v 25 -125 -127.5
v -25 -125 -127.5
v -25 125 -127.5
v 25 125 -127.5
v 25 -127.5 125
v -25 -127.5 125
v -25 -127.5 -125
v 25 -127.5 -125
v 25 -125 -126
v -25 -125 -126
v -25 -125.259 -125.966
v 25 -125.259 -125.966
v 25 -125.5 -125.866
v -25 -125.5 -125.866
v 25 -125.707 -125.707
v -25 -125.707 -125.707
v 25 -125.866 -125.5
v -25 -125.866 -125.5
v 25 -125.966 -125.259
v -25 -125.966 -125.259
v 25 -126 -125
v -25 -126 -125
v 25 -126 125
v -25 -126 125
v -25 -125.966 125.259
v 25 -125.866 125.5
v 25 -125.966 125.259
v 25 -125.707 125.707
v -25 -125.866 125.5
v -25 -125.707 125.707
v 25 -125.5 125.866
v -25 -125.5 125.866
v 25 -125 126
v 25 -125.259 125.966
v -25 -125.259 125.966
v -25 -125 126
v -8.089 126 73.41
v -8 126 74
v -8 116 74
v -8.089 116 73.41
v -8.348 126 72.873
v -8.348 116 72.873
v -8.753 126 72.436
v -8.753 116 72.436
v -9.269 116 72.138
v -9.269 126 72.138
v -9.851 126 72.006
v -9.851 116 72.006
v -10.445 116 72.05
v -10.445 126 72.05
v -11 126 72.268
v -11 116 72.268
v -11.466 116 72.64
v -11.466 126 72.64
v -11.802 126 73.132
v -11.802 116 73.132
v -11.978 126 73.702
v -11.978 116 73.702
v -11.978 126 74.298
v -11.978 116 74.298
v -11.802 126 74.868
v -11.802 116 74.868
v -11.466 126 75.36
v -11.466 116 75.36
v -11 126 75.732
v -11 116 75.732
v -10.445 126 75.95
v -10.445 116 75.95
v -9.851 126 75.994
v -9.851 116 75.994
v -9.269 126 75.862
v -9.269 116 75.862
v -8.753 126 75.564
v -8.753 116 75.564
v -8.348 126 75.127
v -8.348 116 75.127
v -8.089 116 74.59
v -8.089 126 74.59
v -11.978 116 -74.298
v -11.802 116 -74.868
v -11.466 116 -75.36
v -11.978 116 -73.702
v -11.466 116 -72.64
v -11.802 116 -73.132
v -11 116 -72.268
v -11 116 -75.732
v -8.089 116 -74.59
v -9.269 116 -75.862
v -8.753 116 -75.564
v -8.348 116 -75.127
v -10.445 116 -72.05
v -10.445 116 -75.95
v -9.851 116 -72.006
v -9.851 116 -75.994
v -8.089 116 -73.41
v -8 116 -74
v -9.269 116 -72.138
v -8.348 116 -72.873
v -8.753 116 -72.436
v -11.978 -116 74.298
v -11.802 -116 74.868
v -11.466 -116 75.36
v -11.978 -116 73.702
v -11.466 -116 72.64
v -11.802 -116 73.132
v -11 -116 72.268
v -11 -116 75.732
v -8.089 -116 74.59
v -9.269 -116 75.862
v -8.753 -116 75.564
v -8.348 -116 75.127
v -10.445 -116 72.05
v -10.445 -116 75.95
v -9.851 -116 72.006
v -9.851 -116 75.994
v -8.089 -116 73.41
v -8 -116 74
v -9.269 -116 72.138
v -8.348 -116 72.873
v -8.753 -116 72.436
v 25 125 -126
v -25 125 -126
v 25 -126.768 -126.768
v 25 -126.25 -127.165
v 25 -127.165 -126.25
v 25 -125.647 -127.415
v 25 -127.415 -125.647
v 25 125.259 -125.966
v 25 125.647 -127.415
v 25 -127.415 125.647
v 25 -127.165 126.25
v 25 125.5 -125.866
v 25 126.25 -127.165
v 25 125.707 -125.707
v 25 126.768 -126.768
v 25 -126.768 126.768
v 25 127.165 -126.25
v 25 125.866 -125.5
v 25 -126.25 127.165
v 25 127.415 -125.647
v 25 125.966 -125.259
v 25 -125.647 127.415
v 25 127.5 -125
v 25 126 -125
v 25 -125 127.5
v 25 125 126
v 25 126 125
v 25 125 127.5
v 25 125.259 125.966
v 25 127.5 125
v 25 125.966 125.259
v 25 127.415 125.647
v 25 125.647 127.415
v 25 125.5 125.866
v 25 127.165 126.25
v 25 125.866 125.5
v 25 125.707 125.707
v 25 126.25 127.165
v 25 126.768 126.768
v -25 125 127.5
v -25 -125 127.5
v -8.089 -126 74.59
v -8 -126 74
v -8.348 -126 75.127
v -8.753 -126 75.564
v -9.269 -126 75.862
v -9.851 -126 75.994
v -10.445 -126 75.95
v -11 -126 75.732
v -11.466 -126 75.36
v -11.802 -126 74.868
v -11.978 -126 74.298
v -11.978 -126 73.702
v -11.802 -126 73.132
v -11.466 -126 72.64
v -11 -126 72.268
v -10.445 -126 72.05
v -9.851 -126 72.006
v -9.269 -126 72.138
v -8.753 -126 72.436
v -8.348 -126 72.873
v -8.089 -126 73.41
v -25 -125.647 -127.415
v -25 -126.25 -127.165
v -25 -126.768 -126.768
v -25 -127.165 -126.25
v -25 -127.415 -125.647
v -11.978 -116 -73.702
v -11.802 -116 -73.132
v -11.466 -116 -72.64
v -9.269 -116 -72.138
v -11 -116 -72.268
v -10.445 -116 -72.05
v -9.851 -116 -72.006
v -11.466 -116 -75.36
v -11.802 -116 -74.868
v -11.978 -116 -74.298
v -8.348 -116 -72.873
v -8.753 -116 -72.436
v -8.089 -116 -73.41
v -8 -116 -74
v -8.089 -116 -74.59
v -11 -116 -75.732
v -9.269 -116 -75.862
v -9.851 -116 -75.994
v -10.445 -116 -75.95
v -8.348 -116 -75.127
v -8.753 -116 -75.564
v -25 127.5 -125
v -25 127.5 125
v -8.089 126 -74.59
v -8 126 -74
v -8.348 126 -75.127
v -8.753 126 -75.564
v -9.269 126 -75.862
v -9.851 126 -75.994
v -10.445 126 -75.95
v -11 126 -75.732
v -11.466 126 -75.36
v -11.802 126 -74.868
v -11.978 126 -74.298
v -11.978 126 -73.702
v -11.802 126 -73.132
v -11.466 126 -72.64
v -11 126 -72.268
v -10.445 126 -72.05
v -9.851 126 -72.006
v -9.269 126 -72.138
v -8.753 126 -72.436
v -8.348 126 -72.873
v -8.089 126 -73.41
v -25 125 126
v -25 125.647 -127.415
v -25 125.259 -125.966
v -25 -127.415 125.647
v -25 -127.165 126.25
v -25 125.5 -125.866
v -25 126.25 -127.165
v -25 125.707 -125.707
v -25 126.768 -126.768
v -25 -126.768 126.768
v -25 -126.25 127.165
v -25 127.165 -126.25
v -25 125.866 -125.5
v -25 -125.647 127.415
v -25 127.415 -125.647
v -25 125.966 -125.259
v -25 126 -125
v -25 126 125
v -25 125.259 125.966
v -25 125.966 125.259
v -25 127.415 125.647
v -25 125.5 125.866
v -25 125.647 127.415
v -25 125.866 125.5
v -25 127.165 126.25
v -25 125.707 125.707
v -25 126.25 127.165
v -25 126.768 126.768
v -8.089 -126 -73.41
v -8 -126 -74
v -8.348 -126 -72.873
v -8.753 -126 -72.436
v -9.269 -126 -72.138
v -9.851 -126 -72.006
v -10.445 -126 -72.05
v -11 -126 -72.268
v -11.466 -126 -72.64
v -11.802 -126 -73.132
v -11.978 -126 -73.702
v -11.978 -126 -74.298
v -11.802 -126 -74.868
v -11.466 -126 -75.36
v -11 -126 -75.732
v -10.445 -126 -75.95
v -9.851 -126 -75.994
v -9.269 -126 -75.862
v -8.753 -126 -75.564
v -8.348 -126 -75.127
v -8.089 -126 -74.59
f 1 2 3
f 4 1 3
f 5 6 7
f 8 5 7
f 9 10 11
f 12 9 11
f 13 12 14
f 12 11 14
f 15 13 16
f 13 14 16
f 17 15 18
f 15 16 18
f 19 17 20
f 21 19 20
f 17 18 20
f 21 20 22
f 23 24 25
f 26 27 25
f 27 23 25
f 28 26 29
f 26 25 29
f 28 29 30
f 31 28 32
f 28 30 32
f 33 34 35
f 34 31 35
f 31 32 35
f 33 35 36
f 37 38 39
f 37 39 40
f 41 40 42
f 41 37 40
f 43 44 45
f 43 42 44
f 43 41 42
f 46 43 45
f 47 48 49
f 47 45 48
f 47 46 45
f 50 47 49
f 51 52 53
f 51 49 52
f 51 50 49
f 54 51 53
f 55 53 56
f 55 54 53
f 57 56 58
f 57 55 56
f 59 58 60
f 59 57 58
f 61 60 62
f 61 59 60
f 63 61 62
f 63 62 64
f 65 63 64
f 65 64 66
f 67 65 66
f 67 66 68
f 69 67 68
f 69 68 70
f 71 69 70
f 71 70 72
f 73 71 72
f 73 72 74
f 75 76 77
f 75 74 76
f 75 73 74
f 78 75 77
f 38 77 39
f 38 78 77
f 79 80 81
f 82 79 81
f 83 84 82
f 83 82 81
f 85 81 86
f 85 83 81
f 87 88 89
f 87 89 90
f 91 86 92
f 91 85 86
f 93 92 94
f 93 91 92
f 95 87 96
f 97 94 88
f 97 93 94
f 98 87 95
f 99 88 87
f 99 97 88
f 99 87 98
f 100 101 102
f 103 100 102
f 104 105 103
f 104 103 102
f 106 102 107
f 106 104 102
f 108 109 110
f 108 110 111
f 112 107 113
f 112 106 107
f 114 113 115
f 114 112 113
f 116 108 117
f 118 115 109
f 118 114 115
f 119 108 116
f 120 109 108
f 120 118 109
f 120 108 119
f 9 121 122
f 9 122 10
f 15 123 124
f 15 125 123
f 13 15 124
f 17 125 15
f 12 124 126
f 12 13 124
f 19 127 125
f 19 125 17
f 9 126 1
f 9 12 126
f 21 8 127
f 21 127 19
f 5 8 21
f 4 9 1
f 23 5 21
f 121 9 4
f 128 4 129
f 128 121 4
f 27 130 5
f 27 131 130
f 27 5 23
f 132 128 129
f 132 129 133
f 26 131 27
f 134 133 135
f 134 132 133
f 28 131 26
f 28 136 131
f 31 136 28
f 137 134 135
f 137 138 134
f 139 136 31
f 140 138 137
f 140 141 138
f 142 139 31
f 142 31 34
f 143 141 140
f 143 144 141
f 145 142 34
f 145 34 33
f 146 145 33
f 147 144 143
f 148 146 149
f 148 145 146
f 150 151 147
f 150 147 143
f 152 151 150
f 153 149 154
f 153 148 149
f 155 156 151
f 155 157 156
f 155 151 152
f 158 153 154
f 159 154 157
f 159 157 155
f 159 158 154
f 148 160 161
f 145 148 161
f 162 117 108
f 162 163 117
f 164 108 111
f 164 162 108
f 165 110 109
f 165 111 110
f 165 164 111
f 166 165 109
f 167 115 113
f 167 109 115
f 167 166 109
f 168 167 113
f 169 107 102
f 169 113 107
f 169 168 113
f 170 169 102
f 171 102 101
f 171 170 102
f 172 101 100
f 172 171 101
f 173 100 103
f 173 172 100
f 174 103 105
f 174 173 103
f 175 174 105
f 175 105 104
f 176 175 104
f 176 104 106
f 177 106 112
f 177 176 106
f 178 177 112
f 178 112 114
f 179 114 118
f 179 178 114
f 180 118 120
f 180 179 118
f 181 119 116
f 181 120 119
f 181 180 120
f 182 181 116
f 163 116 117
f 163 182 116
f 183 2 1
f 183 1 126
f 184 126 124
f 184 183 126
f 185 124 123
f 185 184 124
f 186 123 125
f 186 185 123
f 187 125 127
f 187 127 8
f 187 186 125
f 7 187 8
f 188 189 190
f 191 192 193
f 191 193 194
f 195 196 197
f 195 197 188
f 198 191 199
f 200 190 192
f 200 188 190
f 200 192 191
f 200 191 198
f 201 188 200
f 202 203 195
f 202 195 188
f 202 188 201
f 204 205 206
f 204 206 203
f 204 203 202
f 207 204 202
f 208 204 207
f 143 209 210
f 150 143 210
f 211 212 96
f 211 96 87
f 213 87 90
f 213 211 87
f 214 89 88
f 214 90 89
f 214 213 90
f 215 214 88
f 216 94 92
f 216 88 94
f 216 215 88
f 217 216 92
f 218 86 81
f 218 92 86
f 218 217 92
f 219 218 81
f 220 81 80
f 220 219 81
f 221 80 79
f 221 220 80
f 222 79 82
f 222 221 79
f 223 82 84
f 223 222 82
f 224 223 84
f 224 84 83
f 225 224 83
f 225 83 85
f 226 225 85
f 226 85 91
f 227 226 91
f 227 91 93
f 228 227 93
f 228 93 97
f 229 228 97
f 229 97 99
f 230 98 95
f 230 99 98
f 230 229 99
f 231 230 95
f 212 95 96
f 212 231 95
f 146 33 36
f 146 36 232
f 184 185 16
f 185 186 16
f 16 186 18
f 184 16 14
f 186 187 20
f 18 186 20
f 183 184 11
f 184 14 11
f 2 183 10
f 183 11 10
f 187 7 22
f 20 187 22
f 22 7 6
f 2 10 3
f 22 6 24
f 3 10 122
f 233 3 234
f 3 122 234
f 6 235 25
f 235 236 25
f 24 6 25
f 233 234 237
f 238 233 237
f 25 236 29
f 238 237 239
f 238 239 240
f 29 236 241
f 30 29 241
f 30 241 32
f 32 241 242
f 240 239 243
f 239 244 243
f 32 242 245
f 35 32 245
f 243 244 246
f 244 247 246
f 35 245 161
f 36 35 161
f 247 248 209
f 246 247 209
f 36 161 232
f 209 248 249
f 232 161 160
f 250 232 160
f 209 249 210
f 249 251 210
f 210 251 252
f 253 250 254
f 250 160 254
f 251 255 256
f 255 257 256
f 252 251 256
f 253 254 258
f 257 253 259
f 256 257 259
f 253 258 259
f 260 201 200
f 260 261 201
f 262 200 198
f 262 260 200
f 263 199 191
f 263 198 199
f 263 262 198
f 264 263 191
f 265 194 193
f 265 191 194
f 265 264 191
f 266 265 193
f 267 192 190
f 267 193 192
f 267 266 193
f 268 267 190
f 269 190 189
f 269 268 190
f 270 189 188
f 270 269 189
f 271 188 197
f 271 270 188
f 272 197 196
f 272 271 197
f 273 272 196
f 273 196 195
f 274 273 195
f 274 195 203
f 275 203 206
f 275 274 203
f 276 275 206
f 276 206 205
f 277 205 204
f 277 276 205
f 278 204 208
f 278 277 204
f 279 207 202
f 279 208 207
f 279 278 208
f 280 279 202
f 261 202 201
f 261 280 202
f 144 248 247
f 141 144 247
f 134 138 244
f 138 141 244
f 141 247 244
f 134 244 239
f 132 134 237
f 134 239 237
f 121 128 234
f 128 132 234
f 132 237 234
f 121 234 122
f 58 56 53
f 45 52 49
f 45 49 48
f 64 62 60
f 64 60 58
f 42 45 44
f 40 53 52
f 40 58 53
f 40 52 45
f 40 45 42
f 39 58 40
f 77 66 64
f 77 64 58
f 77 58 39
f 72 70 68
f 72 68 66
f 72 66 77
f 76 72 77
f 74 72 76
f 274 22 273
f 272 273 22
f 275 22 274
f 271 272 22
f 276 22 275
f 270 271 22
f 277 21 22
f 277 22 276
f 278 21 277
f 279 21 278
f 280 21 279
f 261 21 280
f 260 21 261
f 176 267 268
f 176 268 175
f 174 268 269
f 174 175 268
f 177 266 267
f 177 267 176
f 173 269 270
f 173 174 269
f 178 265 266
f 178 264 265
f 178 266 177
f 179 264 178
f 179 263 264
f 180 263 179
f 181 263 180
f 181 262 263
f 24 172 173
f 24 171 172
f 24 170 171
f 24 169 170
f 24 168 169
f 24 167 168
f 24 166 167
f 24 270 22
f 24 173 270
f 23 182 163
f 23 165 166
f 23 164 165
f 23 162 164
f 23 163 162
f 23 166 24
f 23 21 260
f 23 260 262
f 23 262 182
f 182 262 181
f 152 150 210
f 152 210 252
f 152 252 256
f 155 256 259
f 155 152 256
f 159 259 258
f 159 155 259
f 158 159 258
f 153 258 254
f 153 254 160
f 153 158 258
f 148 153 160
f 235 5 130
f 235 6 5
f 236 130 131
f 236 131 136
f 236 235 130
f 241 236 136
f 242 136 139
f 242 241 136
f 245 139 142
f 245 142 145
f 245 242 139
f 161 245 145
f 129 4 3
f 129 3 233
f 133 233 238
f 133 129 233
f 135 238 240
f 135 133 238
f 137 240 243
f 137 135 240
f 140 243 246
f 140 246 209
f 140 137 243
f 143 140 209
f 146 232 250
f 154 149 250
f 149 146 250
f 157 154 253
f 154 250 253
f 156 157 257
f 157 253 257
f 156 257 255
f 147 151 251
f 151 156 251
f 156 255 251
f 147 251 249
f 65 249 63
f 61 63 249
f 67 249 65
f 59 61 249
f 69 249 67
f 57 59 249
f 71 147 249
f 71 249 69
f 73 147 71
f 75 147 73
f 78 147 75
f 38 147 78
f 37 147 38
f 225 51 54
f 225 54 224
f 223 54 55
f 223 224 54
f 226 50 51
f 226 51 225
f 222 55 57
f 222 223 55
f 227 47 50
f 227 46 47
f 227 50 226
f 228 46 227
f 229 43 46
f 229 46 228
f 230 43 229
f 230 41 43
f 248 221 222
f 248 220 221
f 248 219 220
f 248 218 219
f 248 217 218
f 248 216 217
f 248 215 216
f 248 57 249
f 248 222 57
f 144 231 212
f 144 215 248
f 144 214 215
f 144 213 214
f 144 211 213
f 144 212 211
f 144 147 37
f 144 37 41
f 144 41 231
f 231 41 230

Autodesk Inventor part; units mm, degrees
ref_plane "YZ Plane" through (0, 0, 0) normal (1, 0, 0) x (0, 1, 0)
ref_plane "XZ Plane" through (0, 0, 0) normal (0, 1, 0) x (-1, 0, 0)
ref_plane "XY Plane" through (0, 0, 0) normal (0, 0, 1) x (1, 0, 0)
sketch "Skizze1" plane through (0, 0, 0) normal (1, 0, 0) x (0, 1, 0)
  line L0 (0, -178.5) -> (0, 178.5) projected
  line L1 (-178.5, 0) -> (178.5, 0) projected
  line L2 (127.5, 127.5) -> (-127.5, 127.5)
  line L3 (-127.5, 127.5) -> (-127.5, -127.5)
  line L4 (-127.5, -127.5) -> (127.5, -127.5)
  line L5 (127.5, -127.5) -> (127.5, 127.5)
  point P0 (0, 0)
  dimension "d0" = 255
  dimension "d1" = 255
extrude "Extrusion1" add sketch "Skizze1" along normal mid plane 50
sketch "Skizze2" plane through (25, 0, 0) normal (1, 0, 0) x (0, 0, -1)
  line L0 (0, -178.5) -> (0, 178.5) projected
  line L1 (178.5, 0) -> (-178.5, 0) projected
  line L2 (-126, 126) -> (126, 126)
  line L3 (126, 126) -> (126, -126)
  line L4 (126, -126) -> (-126, -126)
  line L5 (-126, -126) -> (-126, 126)
  point P0 (0, 0)
  dimension "d4" = 252
  dimension "d5" = 252
extrude "Extrusion2" cut sketch "Skizze2" against normal blind 50
fillet "Rundung1" radius 2.5 4 edges at (0, 127.5, 127.5) (0, 127.5, -127.5) (0, -127.5, 127.5) (0, -127.5, -127.5)
fillet "Rundung2" radius 1 4 edges at (0, 126, 126) (0, 126, -126) (0, -126, -126) (0, -126, 126)
sketch "Skizze3" plane through (25, -126, 125) normal (0, 1, 0) x (1, 0, 0)
  circle A0 centre (-35, 51) radius 2
  circle A1 centre (-35, 199) radius 2
  line L0 (0, 0) -> (-50, 0) projected
  line L1 (-50, 0) -> (-50, 250) projected
  point P0 (-50, -1)
  dimension "d15" = 4
  dimension "d16" = 4
  dimension "d19" = 52
  dimension "d20" = 148
  dimension "d21" = 15
  dimension "d22" = 15
extrude "Extrusion3" add sketch "Skizze3" along normal blind 10
sketch "Skizze4" plane through (25, 126, -125) normal (0, -1, 0) x (1, 0, 0)
  circle A0 centre (-35, 51) radius 2
  circle A1 centre (-35, 199) radius 2
  line L0 (-50, 0) -> (-50, 250) projected
  point P0 (-25, 125)
  point P1 (-50, -1)
  dimension "d23" = 4
  dimension "d24" = 4
  dimension "d25" = 15
  dimension "d26" = 15
  dimension "d27" = 52
  dimension "d28" = 148
extrude "Extrusion4" add sketch "Skizze4" along normal blind 10
properties part number "Aussengehäuse" material "Stahl"
